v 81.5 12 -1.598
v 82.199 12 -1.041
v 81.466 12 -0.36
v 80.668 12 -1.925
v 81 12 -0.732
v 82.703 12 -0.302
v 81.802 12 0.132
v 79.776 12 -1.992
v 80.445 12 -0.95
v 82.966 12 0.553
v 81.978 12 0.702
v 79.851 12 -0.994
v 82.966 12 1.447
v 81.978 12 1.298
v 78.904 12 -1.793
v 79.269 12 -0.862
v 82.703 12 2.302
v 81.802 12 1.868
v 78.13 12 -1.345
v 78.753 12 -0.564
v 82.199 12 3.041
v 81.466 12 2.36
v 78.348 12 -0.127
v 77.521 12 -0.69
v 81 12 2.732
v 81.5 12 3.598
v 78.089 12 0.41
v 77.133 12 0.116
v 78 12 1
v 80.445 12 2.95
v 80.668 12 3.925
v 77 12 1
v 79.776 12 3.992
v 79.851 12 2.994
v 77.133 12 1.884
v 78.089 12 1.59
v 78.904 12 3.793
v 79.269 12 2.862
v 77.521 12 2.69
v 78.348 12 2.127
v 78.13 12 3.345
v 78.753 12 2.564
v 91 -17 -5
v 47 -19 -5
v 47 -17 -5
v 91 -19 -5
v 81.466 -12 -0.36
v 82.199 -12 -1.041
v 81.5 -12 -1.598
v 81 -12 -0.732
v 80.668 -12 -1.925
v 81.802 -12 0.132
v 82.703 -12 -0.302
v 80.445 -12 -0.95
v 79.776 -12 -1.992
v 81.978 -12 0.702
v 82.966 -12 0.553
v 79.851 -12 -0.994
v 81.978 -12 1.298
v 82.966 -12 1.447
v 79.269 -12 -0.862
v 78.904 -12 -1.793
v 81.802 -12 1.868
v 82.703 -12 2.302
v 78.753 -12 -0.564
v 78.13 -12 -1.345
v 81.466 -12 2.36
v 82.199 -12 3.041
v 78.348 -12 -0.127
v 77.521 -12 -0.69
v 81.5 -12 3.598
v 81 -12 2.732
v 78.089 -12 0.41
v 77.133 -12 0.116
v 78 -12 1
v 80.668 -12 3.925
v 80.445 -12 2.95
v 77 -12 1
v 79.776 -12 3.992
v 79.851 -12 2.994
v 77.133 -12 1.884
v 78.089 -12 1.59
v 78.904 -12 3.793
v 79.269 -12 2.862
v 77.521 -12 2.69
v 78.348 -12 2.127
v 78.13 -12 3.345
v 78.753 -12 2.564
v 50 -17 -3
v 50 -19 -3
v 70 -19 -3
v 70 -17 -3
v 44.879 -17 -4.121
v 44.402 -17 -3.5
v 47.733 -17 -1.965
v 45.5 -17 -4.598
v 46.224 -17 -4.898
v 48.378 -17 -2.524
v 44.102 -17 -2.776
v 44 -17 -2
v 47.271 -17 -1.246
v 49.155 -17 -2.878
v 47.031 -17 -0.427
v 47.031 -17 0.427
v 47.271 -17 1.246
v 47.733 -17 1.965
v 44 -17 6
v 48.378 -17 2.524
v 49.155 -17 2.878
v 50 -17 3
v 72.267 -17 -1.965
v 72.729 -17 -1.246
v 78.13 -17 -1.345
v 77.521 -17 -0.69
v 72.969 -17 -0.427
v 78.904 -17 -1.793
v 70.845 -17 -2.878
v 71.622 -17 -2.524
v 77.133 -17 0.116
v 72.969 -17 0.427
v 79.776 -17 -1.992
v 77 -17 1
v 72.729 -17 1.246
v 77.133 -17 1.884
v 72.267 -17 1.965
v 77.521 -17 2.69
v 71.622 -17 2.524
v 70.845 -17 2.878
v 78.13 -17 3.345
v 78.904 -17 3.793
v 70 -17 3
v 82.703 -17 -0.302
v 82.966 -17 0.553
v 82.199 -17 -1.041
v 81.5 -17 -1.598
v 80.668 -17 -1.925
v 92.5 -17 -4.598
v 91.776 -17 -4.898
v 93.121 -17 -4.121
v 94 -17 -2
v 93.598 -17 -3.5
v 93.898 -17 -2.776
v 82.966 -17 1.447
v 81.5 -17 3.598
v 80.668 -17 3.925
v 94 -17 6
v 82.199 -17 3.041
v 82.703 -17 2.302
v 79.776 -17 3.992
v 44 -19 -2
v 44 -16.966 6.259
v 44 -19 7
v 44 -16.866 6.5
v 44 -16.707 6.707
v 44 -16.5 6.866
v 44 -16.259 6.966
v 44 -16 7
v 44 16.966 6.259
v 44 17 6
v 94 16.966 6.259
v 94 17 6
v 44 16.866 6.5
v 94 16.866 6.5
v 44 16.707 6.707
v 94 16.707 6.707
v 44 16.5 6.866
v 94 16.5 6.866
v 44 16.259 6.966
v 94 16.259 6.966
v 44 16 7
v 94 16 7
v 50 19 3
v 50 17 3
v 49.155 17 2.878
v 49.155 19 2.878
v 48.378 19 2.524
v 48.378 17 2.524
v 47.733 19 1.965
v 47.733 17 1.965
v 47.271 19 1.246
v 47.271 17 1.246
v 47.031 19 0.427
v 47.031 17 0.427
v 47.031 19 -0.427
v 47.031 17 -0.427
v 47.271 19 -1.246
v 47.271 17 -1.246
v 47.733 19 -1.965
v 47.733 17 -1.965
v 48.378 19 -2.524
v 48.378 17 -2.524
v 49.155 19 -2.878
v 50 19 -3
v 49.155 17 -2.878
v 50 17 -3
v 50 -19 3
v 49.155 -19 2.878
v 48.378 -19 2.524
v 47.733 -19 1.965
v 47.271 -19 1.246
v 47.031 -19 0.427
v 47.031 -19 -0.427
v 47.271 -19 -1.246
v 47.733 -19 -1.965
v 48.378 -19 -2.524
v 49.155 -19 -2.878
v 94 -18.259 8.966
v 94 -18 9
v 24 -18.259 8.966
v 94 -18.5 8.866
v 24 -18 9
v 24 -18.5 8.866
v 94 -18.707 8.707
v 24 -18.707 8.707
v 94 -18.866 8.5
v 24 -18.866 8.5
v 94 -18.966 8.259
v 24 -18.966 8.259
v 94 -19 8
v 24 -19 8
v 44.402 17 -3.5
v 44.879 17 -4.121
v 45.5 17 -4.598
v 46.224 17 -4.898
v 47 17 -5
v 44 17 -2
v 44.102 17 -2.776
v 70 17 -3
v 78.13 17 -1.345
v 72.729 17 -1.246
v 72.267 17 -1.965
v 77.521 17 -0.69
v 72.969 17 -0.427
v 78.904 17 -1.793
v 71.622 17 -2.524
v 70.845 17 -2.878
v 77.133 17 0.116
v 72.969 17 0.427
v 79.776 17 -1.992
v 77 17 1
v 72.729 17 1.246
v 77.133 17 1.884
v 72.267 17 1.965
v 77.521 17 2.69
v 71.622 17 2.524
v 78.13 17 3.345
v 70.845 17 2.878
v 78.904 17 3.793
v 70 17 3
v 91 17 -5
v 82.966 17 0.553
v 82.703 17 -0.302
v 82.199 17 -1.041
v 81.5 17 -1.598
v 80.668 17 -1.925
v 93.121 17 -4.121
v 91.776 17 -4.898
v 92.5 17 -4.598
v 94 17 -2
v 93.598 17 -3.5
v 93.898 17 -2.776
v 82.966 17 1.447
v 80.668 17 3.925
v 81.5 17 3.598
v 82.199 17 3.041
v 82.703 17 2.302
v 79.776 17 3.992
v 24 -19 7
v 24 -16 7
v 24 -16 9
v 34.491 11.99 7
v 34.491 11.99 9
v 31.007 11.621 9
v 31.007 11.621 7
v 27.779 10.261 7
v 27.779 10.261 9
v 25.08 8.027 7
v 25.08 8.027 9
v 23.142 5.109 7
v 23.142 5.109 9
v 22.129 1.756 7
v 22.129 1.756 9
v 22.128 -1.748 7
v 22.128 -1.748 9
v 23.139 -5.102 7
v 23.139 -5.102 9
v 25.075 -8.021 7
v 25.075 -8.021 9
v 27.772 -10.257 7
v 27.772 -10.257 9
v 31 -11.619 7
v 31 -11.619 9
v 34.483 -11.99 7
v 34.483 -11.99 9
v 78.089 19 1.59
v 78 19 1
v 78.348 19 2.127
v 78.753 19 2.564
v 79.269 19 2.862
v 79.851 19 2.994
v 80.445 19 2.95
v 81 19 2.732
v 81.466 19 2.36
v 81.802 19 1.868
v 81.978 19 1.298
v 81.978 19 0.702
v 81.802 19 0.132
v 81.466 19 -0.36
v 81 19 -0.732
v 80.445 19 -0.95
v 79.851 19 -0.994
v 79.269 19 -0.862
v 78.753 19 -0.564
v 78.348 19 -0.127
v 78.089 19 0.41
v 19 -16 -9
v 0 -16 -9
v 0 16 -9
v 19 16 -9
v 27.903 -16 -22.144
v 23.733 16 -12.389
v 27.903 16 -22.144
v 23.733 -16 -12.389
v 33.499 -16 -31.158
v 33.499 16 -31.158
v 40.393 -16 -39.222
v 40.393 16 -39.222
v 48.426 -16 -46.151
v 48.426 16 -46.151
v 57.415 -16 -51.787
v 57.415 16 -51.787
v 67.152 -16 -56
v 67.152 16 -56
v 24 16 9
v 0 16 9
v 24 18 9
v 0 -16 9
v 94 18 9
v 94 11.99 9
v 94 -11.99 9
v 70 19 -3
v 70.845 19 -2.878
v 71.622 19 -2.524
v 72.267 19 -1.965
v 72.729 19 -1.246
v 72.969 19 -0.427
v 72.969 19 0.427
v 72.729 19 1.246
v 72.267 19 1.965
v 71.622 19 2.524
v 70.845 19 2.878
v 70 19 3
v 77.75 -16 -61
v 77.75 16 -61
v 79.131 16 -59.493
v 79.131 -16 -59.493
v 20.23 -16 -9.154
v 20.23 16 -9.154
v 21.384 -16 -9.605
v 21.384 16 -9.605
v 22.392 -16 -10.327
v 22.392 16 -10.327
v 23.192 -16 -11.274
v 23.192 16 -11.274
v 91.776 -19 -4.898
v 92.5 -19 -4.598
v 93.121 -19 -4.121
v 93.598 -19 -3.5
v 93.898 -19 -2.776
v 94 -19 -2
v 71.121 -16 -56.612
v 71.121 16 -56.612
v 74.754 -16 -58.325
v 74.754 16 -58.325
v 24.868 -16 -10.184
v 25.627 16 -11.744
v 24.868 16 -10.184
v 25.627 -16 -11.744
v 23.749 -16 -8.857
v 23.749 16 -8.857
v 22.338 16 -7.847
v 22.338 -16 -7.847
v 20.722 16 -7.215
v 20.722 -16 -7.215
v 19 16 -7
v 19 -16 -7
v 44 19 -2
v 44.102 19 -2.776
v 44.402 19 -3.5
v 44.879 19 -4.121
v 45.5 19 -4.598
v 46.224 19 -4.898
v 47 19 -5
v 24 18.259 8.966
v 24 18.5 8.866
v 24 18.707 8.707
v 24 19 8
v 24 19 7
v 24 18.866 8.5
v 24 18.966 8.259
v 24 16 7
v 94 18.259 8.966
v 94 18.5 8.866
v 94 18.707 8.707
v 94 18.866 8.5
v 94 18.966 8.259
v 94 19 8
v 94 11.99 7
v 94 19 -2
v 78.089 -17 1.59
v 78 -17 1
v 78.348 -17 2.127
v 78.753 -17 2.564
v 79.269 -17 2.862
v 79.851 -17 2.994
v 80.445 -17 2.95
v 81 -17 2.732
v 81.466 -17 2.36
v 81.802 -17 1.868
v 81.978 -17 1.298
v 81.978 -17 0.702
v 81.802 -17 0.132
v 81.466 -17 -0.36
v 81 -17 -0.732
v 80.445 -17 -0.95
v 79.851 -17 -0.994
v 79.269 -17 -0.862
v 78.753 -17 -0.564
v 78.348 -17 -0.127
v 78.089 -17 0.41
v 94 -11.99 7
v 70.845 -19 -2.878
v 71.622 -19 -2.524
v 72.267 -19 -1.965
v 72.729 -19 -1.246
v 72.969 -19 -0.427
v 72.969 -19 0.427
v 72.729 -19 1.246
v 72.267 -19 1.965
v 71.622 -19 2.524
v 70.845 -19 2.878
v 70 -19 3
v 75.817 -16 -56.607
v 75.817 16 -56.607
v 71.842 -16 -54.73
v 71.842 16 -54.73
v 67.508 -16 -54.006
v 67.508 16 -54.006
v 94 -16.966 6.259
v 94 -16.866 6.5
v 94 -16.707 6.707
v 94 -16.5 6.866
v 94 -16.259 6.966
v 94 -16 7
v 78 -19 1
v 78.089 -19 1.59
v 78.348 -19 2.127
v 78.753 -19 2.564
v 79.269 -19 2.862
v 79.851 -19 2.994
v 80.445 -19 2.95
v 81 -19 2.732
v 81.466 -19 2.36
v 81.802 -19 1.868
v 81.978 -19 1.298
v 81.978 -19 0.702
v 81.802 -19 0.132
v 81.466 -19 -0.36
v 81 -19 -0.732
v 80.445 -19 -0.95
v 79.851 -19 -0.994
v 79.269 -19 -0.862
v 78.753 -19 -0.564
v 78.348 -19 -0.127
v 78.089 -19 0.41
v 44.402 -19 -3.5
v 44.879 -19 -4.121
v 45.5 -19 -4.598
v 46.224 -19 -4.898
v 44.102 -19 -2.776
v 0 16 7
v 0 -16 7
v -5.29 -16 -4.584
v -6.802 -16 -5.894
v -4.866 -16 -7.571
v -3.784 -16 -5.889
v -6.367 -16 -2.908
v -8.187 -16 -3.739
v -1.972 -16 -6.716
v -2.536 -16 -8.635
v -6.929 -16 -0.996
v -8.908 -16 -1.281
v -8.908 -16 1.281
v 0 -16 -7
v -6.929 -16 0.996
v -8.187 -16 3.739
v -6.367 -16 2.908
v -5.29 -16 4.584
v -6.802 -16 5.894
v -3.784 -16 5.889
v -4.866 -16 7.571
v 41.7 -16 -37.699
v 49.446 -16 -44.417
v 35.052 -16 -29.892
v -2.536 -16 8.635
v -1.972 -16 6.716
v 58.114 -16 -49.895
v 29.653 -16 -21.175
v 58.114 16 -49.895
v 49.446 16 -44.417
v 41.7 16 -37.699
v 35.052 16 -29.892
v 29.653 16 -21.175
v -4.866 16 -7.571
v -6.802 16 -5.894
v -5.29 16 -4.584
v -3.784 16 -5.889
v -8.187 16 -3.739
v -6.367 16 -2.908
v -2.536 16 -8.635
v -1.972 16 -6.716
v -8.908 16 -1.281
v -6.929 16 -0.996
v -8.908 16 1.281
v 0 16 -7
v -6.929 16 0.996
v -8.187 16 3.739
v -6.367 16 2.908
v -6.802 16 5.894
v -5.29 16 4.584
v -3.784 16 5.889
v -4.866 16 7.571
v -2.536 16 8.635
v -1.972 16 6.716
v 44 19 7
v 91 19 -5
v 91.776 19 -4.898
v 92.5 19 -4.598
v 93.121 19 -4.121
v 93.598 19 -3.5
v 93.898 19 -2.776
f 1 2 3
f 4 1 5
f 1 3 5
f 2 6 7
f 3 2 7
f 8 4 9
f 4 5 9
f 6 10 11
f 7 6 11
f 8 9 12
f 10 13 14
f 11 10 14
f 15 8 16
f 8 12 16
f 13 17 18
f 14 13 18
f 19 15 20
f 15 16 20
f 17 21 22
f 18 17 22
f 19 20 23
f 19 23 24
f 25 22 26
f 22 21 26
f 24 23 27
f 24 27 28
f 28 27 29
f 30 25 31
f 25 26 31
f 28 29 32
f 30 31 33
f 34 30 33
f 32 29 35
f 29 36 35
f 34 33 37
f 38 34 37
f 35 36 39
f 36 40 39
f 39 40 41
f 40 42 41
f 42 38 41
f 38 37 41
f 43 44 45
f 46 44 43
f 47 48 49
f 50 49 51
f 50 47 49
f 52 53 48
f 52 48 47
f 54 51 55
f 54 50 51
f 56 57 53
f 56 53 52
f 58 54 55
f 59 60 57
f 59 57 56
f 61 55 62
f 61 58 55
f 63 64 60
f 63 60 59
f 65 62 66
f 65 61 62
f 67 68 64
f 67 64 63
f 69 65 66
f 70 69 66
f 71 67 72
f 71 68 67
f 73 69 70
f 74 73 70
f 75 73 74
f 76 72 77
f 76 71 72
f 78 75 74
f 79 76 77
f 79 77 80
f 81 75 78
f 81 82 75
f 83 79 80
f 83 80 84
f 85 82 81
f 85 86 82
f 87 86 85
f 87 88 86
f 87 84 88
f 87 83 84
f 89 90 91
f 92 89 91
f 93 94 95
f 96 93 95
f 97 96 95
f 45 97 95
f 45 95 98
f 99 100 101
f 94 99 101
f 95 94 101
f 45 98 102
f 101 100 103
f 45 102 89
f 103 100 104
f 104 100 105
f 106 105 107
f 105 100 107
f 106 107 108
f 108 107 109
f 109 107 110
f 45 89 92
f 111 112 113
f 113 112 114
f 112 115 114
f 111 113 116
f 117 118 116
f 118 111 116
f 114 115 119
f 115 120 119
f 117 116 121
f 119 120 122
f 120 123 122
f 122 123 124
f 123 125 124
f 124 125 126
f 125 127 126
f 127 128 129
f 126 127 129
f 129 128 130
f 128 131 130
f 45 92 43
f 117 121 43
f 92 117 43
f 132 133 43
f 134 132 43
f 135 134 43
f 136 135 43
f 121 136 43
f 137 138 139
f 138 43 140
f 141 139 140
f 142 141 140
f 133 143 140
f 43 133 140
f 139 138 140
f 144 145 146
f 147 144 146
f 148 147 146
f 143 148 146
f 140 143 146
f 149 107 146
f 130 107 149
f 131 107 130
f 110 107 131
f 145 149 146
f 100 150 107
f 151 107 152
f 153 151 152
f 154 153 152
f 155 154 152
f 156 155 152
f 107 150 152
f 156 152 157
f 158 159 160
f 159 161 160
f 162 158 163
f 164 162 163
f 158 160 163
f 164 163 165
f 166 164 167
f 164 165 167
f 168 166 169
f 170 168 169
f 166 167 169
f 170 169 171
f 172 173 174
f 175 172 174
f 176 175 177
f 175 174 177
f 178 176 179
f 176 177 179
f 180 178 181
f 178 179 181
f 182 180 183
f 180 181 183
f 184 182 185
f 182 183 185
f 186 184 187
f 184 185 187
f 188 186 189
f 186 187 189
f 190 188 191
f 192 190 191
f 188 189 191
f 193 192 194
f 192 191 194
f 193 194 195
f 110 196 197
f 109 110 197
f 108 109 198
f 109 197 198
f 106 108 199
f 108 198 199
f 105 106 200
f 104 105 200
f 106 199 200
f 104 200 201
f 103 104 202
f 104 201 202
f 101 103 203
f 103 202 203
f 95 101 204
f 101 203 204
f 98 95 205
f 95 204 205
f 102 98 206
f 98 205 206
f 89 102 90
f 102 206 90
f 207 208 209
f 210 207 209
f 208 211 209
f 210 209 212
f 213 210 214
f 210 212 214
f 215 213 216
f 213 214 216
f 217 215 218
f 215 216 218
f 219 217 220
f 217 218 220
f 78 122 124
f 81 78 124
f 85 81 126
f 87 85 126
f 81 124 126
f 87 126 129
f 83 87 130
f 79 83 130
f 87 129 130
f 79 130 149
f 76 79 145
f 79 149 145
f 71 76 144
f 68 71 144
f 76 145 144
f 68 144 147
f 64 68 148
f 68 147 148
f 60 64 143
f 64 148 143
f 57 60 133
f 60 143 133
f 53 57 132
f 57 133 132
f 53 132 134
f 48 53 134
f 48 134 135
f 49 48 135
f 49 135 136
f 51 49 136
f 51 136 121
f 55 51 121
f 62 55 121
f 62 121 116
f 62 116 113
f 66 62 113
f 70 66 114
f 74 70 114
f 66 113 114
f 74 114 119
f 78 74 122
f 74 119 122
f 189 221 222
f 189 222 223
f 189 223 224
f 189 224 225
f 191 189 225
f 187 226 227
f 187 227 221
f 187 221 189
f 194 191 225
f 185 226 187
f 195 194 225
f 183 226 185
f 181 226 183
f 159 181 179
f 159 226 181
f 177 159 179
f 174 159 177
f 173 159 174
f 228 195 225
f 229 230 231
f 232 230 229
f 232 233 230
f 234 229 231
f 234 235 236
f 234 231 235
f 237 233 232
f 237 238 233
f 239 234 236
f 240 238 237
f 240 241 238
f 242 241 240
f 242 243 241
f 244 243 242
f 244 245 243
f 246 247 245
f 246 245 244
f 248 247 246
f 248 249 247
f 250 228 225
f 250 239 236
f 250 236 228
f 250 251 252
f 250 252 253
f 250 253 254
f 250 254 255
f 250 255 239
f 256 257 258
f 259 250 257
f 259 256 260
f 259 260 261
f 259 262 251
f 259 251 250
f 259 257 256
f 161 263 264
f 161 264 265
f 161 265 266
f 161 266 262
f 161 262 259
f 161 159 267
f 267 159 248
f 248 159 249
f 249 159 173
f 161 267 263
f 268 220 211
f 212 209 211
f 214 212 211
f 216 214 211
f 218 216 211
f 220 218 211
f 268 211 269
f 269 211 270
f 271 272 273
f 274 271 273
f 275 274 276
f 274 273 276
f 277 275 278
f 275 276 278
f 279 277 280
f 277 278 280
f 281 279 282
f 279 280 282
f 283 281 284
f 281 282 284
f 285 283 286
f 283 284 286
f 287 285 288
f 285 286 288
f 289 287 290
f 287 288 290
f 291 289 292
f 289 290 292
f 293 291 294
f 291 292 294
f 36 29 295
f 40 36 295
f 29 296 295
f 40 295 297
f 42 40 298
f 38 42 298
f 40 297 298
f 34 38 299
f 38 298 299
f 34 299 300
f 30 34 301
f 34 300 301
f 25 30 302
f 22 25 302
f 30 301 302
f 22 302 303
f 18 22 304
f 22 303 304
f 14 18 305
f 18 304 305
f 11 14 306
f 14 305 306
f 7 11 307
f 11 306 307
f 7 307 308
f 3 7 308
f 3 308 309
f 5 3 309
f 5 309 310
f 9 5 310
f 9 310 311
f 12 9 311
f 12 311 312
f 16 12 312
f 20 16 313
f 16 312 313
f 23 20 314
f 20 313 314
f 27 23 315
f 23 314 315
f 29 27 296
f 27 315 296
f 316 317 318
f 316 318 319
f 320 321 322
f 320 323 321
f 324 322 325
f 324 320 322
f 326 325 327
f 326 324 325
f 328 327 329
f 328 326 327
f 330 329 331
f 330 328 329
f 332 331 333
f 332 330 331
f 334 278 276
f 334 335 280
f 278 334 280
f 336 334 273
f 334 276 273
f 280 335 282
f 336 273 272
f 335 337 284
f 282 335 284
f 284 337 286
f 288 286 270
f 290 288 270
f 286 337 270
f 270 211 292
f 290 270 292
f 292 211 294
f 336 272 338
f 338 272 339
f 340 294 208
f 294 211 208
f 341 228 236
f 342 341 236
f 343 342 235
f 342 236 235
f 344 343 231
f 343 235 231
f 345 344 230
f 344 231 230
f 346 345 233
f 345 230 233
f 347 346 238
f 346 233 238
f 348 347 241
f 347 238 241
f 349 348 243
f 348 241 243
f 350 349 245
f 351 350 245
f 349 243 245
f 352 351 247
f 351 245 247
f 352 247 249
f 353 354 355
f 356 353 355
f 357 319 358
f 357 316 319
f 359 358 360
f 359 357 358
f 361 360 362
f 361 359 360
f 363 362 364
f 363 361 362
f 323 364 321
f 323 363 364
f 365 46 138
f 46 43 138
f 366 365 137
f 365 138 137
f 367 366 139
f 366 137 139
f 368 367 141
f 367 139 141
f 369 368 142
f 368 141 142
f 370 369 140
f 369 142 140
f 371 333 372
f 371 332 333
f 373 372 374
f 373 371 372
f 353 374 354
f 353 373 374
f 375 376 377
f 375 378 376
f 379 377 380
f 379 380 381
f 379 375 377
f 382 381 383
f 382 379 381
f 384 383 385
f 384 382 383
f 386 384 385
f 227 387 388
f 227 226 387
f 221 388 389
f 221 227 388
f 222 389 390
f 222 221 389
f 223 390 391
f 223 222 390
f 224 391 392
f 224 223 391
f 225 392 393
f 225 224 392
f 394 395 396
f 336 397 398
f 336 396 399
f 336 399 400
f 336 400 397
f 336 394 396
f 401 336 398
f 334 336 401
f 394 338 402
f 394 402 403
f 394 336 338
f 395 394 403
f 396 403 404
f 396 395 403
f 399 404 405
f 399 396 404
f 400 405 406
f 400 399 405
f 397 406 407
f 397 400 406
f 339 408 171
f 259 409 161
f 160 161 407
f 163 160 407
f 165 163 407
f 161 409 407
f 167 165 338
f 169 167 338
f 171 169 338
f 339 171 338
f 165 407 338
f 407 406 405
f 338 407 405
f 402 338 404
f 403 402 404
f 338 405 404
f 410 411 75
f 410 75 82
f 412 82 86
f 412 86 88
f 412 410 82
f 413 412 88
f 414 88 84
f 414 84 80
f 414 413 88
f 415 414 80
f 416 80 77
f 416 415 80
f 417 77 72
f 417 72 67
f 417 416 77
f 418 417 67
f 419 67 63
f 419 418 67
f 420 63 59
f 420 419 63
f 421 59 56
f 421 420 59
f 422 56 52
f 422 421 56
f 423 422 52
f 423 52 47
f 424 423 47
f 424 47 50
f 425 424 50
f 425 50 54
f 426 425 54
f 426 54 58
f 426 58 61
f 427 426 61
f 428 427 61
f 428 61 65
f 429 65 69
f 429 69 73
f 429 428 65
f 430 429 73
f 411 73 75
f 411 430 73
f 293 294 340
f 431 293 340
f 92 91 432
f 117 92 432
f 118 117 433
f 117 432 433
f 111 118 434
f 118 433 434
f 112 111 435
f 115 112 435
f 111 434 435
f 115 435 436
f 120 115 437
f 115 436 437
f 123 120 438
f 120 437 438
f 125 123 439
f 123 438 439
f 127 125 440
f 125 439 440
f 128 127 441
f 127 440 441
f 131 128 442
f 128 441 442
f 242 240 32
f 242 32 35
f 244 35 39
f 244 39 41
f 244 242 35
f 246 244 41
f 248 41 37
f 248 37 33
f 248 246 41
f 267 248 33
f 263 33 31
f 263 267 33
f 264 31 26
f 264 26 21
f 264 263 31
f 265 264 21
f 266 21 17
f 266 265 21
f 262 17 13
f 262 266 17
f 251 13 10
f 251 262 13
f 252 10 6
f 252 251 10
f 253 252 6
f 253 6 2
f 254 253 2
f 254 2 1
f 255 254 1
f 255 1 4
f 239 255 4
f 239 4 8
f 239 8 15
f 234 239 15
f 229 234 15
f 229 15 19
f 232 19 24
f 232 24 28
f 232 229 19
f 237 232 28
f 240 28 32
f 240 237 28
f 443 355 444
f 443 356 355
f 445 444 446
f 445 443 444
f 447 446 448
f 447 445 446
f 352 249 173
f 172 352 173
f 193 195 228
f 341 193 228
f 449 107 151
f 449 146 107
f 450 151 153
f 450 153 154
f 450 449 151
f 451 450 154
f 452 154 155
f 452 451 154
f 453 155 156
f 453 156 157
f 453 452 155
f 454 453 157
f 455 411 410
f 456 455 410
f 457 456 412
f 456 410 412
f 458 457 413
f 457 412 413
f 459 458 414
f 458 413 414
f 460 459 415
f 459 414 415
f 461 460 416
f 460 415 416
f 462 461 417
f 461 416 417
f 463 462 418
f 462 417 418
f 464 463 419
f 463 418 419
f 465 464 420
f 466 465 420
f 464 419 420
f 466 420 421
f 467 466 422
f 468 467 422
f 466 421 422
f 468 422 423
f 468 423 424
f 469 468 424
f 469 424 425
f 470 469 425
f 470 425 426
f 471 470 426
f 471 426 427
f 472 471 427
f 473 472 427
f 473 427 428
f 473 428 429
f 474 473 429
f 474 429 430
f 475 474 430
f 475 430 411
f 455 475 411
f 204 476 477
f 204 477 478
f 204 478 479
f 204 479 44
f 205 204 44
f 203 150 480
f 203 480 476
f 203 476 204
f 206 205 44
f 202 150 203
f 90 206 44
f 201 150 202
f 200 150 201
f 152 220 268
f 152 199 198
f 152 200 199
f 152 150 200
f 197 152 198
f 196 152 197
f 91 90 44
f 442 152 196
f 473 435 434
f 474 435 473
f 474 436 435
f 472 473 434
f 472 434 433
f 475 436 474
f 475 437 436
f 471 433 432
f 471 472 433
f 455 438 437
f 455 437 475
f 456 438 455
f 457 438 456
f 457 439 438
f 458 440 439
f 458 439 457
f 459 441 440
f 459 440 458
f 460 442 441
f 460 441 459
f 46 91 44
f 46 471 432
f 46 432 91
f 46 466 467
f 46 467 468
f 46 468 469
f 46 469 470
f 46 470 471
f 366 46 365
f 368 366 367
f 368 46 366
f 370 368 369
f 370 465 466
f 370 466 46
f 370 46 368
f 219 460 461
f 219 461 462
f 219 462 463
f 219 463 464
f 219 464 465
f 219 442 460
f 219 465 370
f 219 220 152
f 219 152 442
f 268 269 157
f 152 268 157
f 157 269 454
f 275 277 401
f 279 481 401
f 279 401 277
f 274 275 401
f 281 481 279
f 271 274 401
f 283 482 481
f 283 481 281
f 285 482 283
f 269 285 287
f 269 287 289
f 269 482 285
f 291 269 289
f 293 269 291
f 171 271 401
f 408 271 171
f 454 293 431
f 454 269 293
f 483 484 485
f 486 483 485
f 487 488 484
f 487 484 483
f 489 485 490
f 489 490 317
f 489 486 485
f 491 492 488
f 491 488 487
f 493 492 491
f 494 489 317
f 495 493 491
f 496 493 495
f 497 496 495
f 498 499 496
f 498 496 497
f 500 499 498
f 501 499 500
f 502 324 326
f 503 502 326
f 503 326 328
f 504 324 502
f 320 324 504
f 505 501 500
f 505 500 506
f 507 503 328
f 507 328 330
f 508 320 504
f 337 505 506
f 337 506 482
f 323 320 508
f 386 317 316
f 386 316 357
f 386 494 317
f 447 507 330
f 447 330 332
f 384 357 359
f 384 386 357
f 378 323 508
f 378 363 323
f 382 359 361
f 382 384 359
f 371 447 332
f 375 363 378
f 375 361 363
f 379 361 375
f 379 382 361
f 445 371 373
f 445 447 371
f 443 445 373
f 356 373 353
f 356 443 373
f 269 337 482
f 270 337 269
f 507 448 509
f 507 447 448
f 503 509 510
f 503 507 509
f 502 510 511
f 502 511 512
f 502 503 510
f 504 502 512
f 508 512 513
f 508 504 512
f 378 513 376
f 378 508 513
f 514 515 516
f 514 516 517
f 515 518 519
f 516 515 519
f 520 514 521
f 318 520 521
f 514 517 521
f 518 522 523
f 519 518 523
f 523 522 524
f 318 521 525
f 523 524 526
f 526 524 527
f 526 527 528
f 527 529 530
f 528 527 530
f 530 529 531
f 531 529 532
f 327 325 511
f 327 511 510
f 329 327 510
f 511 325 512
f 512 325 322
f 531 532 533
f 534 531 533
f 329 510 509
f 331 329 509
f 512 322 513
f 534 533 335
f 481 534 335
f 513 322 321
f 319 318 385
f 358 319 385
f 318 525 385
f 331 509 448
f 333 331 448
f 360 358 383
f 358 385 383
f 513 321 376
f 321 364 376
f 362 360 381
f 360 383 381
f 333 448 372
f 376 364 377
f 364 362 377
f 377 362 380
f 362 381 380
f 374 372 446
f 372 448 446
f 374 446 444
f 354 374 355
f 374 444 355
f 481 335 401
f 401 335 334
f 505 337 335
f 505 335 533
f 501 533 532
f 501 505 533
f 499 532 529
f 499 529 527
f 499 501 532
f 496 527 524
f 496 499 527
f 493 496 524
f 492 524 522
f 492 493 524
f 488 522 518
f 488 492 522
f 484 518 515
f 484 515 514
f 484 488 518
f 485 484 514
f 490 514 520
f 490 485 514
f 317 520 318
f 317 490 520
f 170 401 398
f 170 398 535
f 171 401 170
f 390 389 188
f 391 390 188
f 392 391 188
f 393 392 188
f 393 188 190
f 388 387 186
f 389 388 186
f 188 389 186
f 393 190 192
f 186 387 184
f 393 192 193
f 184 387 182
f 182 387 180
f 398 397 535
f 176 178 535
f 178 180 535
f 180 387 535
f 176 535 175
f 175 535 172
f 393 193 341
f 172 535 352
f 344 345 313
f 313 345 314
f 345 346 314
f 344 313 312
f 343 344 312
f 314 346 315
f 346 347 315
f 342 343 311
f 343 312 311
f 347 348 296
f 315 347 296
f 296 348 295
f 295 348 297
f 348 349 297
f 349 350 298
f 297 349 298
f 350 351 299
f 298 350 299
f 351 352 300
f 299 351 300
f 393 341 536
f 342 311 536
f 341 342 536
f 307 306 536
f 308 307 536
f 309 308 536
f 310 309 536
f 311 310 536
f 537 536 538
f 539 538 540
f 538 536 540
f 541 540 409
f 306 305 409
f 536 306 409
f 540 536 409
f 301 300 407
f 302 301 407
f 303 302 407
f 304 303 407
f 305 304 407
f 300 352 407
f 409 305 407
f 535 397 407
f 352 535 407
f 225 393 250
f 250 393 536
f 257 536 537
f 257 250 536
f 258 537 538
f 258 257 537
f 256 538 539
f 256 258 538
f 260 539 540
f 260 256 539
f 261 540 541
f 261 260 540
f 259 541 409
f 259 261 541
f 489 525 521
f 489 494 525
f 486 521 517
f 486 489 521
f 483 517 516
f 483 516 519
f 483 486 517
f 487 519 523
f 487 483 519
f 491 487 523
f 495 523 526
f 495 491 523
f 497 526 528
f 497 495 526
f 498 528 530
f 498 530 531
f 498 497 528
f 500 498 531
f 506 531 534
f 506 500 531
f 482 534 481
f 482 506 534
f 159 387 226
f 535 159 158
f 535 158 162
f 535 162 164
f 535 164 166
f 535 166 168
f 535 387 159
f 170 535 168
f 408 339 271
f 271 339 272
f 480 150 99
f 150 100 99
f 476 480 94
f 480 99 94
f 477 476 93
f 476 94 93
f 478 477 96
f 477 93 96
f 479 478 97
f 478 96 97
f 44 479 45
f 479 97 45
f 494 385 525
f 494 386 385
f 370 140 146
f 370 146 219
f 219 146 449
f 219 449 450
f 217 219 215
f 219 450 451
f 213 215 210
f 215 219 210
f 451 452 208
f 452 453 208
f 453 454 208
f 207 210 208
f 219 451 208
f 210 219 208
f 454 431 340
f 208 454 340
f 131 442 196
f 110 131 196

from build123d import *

# Parameters (mm, degrees)
F1_DEPTH  = 16
F2_W      = 70
F2_H      = 3
F3_DEPTH  = 2
F4_W      = 50
F4_H      = 14
F5_DEPTH  = 2
F6_R      = 0.99999
F9_DEPTH  = 2
F11_DEPTH = 38.001
F13_D     = 4
F14_R     = 3
F14_R_2   = 2
F15_DEPTH = 5
F16_R     = 3


# Not quite as in the source:
# - a fillet or chamfer is up to 0.001 mm smaller than in the source, because OpenCascade refuses the exact size
# - a pattern or mirror of a feature is missing from the dataset's text; its kind, count and spacing are read off the source's solid


with BuildPart() as f1:
    # F0 (on Front) → F1 (new body)
    with BuildSketch(Plane.XZ):
        with BuildLine():
            Line((94, 9), (0, 9))
            ThreePointArc((0, 9), (-9, 0), (0, -9))
            Line((0, -9), (19, -9))
            ThreePointArc((19, -9), (21.9107246536, -9.9345748081), (23.7333333333, -12.3889272035))
            ThreePointArc((23.7333333333, -12.3889272035), (40.3930033582, -39.2216179023), (67.1516242057, -56))
            ThreePointArc((67.1516242057, -56), (72.9993471235, -57.3376618382), (77.7503977132, -61))
            Line((77.7503977132, -61), (79.1305544342, -59.4934290732))
            ThreePointArc((79.1305544342, -59.4934290732), (73.8943105869, -55.5314515361), (67.507653226, -54.0062881394))
            ThreePointArc((67.507653226, -54.0062881394), (41.6996239436, -37.699069728), (25.6266664621, -11.7444981545))
            ThreePointArc((25.6266664621, -11.7444981545), (23.0750143892, -8.308404907), (19, -7.0000002161))
            Line((19, -7.0000002161), (0, -7.0000002161))
            ThreePointArc((0, -7.0000002161), (-7.0000002161, 0), (0, 7.0000002161))
            Line((0, 7.0000002161), (94, 7.0000002161))
            Line((94, 7.0000002161), (94, 9))
        make_face()
    extrude(amount=F1_DEPTH)

    # F2 (on face) → F3 (join)
    with BuildSketch(Plane.XY.offset(9)):
        with Locations((59, -17.5)):
            Rectangle(F2_W, F2_H)
    extrude(amount=-F3_DEPTH)

    # F4 (on face) → F5 (join)
    with BuildSketch(Plane.XZ.offset(19)):
        with Locations((69, 2)):
            Rectangle(F4_W, F4_H)
    extrude(amount=-F5_DEPTH)

    # F6 (radius 1 in the source; OpenCascade refuses exactly that, so slightly less here)
    f6_edges = [f1.edges().sort_by_distance(p)[0] for p in [
        (69, -17, 7),
        (59, -19, 9),
    ]]
    fillet(f6_edges, radius=F6_R)

    # F7: F1 across face


with BuildPart() as f1_1:
    add(f1.part)
    add(f1.part.mirror(Plane(origin=(37.3146952464, 0, -11.3167767816), x_dir=(1, 0, 0), z_dir=(0, 1, 0))))

    # F8 (on face) → F9 (cut)
    with BuildSketch(Plane.XY.offset(9)):
        with BuildLine():
            Line((94, 11.9899458001), (34.491120871, 11.9899458001))
            ThreePointArc((34.491120871, 11.9899458001), (22.0000006537, 0.0039610115), (34.4832053788, -11.9902674099))
            Line((34.4832053788, -11.9902674099), (94, -11.9902674099))
            Line((94, -11.9902674099), (94, 11.9899458001))
        make_face()
    extrude(amount=-F9_DEPTH, mode=Mode.SUBTRACT)

    # F10 (on face) → F11 (cut, through all)
    with BuildSketch(Plane.XZ.offset(19)):
        with BuildLine():
            ThreePointArc((50, 3), (47, 0), (50, -3))
            Line((50, -3), (70, -3))
            ThreePointArc((70, -3), (73, 0), (70, 3))
            Line((70, 3), (50, 3))
        make_face()
    extrude(amount=-F11_DEPTH, mode=Mode.SUBTRACT)

    # F13 (through all)
    with Locations(Plane.XZ.offset(19)):
        with Locations((80, 1)):
            Hole(F13_D / 2)

    # F14 (on face) → F15 (join)
    with BuildSketch(Plane(origin=(0, -17, 0), x_dir=(-1, 0, 0), z_dir=(0, 1, 0))):
        with Locations((-80, 1)):
            Circle(F14_R)
        with Locations((-80, 1)):
            Circle(F14_R_2, mode=Mode.SUBTRACT)
    f15 = extrude(amount=F15_DEPTH)

    # F15_copies: F15 across plane
    add(f15.mirror(Plane.ZX))

    # F16
    f16_edges = [f1_1.edges().sort_by_distance(p)[0] for p in [
        (94, 18, -5),
        (94, -18, -5),
        (44, -18, -5),
        (44, 18, -5),
    ]]
    fillet(f16_edges, radius=F16_R)


solid = f1_1.part
